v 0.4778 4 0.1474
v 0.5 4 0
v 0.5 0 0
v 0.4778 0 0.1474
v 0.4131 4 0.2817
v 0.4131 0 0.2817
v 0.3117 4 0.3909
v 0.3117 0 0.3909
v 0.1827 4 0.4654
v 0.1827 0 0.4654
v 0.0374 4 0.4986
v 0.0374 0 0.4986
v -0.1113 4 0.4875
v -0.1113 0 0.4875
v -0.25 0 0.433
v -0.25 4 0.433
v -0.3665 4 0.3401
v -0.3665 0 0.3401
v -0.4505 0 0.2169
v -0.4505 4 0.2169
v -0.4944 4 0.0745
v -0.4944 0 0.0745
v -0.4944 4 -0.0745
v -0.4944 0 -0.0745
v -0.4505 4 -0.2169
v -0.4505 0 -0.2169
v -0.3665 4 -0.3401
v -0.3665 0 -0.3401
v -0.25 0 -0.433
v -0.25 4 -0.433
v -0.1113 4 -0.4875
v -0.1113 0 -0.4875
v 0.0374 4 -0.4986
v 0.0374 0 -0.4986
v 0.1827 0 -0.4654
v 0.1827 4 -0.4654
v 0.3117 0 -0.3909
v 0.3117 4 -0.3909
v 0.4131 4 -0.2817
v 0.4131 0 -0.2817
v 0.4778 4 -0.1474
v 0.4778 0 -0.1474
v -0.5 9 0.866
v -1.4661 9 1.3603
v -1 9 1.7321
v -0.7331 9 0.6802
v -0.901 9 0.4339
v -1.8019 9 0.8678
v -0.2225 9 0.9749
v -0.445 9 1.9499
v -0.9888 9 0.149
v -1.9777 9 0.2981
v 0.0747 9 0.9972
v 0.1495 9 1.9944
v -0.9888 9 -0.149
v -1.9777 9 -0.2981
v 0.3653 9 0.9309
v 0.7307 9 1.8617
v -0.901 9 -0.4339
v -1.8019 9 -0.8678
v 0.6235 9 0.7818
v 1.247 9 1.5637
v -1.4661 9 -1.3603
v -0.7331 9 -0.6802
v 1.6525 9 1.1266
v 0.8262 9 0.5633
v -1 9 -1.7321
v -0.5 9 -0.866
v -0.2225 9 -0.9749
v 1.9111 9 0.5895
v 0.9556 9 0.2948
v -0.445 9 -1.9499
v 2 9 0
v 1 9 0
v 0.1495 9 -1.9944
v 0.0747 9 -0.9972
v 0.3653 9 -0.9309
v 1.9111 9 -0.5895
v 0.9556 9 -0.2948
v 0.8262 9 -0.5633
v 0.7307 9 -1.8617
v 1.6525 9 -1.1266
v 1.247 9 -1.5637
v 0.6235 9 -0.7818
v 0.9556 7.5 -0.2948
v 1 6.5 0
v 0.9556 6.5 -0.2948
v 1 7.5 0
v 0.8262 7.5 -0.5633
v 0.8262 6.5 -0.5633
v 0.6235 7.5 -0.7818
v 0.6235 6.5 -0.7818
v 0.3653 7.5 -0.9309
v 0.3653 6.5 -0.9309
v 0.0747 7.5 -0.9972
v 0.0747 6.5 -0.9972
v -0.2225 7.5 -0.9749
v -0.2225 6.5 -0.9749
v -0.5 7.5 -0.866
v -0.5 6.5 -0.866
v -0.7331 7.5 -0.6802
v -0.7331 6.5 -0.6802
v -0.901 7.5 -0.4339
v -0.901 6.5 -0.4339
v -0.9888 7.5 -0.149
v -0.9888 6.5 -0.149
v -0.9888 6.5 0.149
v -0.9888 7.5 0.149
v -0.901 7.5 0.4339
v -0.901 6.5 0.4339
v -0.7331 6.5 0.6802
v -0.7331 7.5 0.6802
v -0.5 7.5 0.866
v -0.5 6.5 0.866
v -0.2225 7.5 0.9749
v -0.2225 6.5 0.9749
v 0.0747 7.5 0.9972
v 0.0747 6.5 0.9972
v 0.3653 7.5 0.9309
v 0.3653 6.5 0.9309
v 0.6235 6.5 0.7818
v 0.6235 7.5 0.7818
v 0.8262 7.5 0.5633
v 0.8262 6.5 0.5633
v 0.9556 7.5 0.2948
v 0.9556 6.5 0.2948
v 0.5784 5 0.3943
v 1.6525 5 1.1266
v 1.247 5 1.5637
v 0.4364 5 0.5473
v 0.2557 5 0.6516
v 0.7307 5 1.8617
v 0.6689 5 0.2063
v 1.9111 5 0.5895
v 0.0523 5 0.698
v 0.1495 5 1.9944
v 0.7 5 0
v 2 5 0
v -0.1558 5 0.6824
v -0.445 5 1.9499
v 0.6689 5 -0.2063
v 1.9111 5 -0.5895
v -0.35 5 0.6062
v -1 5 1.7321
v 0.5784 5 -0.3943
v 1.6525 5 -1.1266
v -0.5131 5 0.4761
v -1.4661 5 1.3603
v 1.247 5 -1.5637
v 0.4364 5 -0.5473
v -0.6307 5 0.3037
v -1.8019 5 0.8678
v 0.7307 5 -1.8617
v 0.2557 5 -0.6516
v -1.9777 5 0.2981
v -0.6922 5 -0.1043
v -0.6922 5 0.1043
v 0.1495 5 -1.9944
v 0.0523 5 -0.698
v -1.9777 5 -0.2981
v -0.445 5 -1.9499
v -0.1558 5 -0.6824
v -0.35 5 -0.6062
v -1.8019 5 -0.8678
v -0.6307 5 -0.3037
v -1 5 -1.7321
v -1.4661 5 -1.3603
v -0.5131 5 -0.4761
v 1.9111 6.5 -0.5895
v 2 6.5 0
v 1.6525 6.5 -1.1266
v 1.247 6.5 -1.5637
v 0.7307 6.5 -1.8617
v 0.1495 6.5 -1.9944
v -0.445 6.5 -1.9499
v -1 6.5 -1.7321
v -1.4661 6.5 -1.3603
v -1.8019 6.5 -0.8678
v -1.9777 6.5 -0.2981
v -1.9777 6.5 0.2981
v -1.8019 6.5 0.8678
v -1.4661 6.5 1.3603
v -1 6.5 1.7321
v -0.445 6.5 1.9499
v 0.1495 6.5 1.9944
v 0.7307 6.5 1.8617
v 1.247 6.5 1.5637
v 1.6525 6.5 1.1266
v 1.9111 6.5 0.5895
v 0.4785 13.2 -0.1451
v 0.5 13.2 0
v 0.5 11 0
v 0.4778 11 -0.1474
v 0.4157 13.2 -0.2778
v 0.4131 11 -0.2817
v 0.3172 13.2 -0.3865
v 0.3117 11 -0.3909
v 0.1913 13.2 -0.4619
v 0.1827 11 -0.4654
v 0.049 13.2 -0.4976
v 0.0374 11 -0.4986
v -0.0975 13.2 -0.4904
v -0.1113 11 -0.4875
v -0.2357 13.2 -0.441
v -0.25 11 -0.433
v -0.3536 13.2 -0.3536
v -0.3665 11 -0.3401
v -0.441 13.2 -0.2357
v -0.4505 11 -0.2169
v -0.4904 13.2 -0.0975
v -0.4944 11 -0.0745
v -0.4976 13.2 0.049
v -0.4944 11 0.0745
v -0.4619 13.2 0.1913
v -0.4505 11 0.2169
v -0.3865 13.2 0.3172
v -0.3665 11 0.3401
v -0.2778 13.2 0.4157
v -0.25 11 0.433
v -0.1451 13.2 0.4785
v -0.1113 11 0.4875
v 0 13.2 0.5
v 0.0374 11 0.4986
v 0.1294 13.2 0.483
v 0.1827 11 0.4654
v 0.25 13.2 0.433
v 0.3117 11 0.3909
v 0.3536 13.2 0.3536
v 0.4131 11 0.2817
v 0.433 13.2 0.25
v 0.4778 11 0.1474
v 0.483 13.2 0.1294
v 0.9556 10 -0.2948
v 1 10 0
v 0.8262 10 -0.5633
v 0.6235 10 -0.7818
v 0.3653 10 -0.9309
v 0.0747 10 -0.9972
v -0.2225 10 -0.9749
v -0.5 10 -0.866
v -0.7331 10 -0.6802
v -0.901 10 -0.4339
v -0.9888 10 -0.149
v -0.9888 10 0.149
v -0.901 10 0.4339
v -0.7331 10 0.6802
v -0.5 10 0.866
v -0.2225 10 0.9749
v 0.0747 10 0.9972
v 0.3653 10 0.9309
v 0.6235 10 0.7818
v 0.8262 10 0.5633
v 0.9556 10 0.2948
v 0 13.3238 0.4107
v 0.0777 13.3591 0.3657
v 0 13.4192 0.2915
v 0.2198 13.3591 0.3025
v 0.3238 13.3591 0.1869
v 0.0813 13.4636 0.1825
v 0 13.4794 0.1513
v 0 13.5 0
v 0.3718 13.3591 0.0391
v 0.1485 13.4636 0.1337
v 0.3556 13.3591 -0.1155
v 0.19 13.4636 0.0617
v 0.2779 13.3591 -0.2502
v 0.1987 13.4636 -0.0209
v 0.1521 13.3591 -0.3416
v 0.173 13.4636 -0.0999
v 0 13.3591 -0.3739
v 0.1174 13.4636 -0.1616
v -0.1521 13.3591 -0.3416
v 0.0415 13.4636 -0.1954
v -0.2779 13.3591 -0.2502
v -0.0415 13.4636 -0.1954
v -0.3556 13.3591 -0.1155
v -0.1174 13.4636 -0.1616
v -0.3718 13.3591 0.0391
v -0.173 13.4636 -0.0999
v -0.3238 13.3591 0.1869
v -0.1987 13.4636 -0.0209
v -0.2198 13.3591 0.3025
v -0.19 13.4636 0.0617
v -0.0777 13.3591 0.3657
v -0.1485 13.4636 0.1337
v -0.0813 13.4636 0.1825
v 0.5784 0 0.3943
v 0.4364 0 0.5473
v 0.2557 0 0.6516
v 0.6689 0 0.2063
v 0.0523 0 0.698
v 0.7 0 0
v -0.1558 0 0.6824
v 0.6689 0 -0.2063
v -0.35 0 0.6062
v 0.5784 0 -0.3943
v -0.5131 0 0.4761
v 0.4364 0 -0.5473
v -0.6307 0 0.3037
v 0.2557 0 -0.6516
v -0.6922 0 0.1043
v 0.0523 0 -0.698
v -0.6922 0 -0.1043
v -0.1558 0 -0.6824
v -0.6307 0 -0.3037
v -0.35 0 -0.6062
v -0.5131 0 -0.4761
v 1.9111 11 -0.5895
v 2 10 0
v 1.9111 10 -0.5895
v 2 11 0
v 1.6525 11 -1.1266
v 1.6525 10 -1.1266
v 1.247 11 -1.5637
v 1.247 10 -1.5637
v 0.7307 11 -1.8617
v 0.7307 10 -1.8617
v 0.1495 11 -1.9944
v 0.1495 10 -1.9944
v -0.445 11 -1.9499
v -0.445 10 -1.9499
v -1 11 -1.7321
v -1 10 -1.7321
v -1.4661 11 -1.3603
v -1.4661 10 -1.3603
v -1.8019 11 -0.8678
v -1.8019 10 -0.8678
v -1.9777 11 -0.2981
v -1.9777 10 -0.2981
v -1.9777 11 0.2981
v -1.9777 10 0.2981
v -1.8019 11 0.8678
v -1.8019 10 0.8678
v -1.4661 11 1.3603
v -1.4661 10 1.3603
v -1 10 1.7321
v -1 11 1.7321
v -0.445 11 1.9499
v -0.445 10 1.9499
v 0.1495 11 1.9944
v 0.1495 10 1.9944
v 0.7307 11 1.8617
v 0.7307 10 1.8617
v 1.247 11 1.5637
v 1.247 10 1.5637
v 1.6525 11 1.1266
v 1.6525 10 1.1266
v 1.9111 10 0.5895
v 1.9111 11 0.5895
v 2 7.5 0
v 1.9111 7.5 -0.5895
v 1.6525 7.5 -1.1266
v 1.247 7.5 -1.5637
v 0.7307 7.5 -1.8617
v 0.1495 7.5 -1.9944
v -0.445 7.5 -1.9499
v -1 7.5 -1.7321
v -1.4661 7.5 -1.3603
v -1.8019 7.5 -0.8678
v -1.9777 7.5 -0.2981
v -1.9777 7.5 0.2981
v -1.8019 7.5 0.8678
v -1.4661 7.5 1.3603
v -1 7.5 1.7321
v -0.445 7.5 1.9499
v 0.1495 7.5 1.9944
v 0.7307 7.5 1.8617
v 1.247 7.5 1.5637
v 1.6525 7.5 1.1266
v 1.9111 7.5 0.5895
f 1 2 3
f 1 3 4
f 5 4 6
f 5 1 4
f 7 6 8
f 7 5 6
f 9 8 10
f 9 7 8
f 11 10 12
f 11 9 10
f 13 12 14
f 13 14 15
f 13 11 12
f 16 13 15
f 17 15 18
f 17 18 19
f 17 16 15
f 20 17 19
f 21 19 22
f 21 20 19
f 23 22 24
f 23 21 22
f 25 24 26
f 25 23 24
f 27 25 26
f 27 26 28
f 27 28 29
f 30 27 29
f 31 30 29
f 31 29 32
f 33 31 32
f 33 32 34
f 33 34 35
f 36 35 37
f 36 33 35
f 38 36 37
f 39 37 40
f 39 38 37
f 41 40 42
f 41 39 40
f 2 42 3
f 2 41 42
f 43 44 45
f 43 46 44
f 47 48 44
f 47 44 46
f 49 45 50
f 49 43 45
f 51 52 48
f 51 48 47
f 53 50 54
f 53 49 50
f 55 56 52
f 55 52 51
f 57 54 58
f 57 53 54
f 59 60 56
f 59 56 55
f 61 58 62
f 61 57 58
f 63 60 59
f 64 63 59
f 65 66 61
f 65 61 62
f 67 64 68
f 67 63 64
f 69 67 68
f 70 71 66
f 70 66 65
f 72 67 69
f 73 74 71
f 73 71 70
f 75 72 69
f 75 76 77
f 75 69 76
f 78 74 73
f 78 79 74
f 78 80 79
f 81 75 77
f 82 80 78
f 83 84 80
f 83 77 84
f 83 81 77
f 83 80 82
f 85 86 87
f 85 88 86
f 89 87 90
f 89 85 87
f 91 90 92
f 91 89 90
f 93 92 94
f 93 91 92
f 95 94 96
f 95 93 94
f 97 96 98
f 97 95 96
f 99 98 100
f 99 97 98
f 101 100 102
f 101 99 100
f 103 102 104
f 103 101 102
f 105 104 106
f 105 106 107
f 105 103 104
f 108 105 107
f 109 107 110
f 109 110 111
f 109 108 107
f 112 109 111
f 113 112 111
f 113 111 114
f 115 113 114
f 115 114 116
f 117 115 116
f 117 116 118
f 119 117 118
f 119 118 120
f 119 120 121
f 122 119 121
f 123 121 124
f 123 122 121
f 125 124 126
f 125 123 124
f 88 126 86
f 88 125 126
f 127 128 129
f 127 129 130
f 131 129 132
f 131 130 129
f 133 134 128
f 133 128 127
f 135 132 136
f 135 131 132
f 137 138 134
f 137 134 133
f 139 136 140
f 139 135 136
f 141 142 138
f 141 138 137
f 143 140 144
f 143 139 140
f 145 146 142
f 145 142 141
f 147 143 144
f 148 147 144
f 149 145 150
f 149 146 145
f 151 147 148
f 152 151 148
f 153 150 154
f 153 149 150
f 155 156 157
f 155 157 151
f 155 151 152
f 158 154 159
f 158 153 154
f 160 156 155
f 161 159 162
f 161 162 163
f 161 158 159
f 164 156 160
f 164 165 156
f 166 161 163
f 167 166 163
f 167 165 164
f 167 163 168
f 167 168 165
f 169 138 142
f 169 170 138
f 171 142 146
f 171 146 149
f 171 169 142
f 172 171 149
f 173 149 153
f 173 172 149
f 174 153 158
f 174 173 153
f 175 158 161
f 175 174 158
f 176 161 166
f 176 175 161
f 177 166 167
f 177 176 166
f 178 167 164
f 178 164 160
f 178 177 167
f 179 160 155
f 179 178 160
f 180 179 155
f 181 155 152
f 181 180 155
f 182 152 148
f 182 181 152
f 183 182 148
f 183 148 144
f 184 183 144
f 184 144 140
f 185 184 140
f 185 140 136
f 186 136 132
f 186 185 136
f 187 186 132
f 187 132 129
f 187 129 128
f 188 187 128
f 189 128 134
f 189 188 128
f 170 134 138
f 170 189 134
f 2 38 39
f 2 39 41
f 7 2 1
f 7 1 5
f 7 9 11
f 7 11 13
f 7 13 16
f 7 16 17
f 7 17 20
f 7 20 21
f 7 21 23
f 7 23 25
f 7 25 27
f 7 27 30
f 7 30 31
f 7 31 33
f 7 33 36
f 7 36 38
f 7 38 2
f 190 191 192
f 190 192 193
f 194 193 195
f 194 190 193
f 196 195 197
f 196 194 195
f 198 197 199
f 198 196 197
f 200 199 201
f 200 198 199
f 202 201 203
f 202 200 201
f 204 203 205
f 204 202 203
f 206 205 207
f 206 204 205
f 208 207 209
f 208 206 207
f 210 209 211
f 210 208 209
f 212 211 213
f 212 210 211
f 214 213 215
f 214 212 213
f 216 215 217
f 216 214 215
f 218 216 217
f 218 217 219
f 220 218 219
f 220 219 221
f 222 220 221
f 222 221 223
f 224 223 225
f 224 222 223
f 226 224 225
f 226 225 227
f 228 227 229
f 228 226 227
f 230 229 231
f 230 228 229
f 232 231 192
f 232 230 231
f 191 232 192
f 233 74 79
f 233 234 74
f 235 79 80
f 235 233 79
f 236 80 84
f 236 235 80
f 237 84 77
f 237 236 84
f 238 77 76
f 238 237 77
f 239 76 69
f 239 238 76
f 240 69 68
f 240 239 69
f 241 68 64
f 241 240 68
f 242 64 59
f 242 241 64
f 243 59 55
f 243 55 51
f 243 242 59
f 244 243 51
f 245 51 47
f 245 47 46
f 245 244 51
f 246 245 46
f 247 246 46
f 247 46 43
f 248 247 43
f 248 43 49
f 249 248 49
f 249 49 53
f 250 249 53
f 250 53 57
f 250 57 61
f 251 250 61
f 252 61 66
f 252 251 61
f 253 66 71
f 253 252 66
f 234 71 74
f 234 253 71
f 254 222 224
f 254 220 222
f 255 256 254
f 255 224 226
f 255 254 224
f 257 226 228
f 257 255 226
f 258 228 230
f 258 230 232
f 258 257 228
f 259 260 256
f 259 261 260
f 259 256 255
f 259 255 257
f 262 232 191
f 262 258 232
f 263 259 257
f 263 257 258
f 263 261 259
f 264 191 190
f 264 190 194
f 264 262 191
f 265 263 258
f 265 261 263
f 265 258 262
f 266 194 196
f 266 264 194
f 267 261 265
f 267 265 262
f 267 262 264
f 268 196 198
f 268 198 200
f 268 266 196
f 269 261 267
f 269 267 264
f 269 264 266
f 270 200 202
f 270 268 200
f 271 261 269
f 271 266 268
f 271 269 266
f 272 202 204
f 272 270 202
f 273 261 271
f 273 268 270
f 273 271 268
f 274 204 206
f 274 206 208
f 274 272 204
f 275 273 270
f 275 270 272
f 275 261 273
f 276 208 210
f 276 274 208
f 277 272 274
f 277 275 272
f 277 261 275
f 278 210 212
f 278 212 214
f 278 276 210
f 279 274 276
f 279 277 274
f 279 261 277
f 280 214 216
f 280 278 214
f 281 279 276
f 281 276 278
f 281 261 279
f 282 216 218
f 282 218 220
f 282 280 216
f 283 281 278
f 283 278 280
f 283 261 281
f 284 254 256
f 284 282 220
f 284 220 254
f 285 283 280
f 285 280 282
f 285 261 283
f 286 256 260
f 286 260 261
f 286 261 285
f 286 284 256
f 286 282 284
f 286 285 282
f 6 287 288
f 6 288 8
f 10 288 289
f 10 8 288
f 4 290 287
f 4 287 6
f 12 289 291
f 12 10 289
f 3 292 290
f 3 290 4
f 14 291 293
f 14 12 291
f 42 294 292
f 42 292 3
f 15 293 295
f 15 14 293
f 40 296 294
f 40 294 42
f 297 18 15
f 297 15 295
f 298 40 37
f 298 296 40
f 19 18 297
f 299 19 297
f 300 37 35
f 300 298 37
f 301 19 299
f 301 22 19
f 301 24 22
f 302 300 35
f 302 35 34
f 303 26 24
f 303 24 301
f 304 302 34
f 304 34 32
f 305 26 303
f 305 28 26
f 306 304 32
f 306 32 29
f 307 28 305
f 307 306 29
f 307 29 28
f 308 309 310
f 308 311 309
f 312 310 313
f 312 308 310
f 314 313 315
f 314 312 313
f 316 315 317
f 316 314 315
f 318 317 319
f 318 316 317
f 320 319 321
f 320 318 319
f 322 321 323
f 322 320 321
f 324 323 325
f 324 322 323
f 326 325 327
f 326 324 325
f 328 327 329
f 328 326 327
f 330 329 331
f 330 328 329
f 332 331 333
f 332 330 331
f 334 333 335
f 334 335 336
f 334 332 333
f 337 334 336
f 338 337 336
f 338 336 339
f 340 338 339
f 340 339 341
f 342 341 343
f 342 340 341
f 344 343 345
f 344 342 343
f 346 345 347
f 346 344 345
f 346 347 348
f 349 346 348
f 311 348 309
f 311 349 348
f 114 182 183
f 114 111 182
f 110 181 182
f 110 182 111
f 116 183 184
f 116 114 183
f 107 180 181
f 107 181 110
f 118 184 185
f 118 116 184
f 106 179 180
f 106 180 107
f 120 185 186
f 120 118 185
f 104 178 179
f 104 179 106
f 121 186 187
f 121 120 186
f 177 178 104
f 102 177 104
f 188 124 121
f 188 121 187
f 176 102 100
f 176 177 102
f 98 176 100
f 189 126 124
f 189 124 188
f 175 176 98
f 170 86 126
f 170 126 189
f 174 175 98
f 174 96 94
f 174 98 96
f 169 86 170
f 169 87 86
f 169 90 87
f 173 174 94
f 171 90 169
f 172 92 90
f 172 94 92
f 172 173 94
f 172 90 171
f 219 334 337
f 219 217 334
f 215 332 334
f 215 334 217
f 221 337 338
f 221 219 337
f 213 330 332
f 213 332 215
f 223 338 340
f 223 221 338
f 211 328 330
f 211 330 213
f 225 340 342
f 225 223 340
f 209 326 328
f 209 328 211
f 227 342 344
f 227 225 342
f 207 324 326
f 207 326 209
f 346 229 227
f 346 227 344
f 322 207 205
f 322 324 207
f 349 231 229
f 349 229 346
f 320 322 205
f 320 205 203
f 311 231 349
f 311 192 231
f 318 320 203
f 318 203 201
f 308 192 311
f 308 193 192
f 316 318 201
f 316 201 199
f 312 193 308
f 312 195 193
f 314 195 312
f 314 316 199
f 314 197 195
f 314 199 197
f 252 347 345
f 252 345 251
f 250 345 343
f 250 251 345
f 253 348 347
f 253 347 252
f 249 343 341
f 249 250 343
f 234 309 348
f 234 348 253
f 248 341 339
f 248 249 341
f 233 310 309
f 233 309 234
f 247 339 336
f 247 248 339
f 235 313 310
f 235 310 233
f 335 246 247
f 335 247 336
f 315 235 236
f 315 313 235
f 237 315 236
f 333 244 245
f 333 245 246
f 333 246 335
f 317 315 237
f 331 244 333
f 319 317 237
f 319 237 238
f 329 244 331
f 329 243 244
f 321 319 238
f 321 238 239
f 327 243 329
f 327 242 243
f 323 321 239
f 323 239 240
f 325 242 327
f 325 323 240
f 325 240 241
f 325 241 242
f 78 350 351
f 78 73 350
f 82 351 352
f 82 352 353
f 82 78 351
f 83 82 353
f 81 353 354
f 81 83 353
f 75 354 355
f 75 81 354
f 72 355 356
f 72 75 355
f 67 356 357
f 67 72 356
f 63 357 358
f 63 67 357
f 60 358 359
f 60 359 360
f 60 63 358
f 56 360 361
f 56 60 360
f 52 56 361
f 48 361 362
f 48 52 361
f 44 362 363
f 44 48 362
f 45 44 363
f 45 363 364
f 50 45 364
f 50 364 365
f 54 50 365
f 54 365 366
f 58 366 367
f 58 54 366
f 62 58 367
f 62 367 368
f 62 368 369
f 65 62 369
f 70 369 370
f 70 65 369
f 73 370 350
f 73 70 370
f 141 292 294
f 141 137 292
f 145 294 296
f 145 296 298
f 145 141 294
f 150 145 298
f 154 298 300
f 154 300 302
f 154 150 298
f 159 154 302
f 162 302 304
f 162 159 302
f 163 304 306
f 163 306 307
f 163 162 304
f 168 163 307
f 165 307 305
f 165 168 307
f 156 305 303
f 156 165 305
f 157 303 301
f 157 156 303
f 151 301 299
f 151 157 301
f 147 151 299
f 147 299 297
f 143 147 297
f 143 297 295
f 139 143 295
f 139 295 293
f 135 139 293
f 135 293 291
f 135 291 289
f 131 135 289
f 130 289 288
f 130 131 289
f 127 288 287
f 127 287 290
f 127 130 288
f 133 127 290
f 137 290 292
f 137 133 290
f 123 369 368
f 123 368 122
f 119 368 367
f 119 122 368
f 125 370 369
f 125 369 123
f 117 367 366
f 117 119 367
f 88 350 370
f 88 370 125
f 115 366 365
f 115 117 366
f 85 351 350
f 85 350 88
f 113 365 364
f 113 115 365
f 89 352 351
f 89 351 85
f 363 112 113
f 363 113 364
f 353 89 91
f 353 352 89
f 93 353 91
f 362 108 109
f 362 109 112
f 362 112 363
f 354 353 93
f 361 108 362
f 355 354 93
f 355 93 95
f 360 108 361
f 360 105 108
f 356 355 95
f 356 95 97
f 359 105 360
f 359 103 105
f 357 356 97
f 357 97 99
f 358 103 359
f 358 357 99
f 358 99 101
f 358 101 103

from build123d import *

# Parameters (mm, degrees)
CUT_EXTRUDE_START   = -4
SKETCH_2_R          = 0.5
CUT_EXTRUDE_1_DEPTH = 4
DOME_1_FACE_RADIUS  = 0.5
DOME_1_HEIGHT       = 0.3


with BuildPart() as part:
    # 草图1 → 旋转2 (revolve)
    with BuildSketch(Plane.XY):
        Polygon((0, 13.2), (0, 0), (0.7, 0), (0.7, 5), (2, 5), (2, 6.5), (1, 6.5), (1, 7.5), (2, 7.5), (2, 9), (1, 9), (1, 10), (2, 10), (2, 11), (0.5, 11), (0.5, 13.2), align=None)
    revolve(axis=Axis((0, 0, 0), (0, 1, 0)))

    # 草图2 → 切除-拉伸1 (cut)
    with BuildSketch(Plane(origin=(0, 0, 0), x_dir=(-1, 0, 0), z_dir=(0, -1, 0)).offset(CUT_EXTRUDE_START)):
        with Locations(Location((0, 0, 0), (0, 0, 180))):
            Circle(SKETCH_2_R)
    extrude(amount=CUT_EXTRUDE_1_DEPTH, mode=Mode.SUBTRACT)

    # 圆顶1: a dome of height H over a round flat face of radius A is a cap of a sphere of radius (A * A + H * H) / (2 * H)
    dome_1_r = (DOME_1_FACE_RADIUS * DOME_1_FACE_RADIUS + DOME_1_HEIGHT * DOME_1_HEIGHT) / (2 * DOME_1_HEIGHT)
    dome_1_base = Plane((0, 13.2, 0), z_dir=(0, 1, 0))
    with Locations(dome_1_base.offset(DOME_1_HEIGHT - dome_1_r)):
        dome_1_ball = Sphere(dome_1_r, mode=Mode.PRIVATE)
    add(split(dome_1_ball, bisect_by=dome_1_base, keep=Keep.TOP, mode=Mode.PRIVATE))


solid = part.part
